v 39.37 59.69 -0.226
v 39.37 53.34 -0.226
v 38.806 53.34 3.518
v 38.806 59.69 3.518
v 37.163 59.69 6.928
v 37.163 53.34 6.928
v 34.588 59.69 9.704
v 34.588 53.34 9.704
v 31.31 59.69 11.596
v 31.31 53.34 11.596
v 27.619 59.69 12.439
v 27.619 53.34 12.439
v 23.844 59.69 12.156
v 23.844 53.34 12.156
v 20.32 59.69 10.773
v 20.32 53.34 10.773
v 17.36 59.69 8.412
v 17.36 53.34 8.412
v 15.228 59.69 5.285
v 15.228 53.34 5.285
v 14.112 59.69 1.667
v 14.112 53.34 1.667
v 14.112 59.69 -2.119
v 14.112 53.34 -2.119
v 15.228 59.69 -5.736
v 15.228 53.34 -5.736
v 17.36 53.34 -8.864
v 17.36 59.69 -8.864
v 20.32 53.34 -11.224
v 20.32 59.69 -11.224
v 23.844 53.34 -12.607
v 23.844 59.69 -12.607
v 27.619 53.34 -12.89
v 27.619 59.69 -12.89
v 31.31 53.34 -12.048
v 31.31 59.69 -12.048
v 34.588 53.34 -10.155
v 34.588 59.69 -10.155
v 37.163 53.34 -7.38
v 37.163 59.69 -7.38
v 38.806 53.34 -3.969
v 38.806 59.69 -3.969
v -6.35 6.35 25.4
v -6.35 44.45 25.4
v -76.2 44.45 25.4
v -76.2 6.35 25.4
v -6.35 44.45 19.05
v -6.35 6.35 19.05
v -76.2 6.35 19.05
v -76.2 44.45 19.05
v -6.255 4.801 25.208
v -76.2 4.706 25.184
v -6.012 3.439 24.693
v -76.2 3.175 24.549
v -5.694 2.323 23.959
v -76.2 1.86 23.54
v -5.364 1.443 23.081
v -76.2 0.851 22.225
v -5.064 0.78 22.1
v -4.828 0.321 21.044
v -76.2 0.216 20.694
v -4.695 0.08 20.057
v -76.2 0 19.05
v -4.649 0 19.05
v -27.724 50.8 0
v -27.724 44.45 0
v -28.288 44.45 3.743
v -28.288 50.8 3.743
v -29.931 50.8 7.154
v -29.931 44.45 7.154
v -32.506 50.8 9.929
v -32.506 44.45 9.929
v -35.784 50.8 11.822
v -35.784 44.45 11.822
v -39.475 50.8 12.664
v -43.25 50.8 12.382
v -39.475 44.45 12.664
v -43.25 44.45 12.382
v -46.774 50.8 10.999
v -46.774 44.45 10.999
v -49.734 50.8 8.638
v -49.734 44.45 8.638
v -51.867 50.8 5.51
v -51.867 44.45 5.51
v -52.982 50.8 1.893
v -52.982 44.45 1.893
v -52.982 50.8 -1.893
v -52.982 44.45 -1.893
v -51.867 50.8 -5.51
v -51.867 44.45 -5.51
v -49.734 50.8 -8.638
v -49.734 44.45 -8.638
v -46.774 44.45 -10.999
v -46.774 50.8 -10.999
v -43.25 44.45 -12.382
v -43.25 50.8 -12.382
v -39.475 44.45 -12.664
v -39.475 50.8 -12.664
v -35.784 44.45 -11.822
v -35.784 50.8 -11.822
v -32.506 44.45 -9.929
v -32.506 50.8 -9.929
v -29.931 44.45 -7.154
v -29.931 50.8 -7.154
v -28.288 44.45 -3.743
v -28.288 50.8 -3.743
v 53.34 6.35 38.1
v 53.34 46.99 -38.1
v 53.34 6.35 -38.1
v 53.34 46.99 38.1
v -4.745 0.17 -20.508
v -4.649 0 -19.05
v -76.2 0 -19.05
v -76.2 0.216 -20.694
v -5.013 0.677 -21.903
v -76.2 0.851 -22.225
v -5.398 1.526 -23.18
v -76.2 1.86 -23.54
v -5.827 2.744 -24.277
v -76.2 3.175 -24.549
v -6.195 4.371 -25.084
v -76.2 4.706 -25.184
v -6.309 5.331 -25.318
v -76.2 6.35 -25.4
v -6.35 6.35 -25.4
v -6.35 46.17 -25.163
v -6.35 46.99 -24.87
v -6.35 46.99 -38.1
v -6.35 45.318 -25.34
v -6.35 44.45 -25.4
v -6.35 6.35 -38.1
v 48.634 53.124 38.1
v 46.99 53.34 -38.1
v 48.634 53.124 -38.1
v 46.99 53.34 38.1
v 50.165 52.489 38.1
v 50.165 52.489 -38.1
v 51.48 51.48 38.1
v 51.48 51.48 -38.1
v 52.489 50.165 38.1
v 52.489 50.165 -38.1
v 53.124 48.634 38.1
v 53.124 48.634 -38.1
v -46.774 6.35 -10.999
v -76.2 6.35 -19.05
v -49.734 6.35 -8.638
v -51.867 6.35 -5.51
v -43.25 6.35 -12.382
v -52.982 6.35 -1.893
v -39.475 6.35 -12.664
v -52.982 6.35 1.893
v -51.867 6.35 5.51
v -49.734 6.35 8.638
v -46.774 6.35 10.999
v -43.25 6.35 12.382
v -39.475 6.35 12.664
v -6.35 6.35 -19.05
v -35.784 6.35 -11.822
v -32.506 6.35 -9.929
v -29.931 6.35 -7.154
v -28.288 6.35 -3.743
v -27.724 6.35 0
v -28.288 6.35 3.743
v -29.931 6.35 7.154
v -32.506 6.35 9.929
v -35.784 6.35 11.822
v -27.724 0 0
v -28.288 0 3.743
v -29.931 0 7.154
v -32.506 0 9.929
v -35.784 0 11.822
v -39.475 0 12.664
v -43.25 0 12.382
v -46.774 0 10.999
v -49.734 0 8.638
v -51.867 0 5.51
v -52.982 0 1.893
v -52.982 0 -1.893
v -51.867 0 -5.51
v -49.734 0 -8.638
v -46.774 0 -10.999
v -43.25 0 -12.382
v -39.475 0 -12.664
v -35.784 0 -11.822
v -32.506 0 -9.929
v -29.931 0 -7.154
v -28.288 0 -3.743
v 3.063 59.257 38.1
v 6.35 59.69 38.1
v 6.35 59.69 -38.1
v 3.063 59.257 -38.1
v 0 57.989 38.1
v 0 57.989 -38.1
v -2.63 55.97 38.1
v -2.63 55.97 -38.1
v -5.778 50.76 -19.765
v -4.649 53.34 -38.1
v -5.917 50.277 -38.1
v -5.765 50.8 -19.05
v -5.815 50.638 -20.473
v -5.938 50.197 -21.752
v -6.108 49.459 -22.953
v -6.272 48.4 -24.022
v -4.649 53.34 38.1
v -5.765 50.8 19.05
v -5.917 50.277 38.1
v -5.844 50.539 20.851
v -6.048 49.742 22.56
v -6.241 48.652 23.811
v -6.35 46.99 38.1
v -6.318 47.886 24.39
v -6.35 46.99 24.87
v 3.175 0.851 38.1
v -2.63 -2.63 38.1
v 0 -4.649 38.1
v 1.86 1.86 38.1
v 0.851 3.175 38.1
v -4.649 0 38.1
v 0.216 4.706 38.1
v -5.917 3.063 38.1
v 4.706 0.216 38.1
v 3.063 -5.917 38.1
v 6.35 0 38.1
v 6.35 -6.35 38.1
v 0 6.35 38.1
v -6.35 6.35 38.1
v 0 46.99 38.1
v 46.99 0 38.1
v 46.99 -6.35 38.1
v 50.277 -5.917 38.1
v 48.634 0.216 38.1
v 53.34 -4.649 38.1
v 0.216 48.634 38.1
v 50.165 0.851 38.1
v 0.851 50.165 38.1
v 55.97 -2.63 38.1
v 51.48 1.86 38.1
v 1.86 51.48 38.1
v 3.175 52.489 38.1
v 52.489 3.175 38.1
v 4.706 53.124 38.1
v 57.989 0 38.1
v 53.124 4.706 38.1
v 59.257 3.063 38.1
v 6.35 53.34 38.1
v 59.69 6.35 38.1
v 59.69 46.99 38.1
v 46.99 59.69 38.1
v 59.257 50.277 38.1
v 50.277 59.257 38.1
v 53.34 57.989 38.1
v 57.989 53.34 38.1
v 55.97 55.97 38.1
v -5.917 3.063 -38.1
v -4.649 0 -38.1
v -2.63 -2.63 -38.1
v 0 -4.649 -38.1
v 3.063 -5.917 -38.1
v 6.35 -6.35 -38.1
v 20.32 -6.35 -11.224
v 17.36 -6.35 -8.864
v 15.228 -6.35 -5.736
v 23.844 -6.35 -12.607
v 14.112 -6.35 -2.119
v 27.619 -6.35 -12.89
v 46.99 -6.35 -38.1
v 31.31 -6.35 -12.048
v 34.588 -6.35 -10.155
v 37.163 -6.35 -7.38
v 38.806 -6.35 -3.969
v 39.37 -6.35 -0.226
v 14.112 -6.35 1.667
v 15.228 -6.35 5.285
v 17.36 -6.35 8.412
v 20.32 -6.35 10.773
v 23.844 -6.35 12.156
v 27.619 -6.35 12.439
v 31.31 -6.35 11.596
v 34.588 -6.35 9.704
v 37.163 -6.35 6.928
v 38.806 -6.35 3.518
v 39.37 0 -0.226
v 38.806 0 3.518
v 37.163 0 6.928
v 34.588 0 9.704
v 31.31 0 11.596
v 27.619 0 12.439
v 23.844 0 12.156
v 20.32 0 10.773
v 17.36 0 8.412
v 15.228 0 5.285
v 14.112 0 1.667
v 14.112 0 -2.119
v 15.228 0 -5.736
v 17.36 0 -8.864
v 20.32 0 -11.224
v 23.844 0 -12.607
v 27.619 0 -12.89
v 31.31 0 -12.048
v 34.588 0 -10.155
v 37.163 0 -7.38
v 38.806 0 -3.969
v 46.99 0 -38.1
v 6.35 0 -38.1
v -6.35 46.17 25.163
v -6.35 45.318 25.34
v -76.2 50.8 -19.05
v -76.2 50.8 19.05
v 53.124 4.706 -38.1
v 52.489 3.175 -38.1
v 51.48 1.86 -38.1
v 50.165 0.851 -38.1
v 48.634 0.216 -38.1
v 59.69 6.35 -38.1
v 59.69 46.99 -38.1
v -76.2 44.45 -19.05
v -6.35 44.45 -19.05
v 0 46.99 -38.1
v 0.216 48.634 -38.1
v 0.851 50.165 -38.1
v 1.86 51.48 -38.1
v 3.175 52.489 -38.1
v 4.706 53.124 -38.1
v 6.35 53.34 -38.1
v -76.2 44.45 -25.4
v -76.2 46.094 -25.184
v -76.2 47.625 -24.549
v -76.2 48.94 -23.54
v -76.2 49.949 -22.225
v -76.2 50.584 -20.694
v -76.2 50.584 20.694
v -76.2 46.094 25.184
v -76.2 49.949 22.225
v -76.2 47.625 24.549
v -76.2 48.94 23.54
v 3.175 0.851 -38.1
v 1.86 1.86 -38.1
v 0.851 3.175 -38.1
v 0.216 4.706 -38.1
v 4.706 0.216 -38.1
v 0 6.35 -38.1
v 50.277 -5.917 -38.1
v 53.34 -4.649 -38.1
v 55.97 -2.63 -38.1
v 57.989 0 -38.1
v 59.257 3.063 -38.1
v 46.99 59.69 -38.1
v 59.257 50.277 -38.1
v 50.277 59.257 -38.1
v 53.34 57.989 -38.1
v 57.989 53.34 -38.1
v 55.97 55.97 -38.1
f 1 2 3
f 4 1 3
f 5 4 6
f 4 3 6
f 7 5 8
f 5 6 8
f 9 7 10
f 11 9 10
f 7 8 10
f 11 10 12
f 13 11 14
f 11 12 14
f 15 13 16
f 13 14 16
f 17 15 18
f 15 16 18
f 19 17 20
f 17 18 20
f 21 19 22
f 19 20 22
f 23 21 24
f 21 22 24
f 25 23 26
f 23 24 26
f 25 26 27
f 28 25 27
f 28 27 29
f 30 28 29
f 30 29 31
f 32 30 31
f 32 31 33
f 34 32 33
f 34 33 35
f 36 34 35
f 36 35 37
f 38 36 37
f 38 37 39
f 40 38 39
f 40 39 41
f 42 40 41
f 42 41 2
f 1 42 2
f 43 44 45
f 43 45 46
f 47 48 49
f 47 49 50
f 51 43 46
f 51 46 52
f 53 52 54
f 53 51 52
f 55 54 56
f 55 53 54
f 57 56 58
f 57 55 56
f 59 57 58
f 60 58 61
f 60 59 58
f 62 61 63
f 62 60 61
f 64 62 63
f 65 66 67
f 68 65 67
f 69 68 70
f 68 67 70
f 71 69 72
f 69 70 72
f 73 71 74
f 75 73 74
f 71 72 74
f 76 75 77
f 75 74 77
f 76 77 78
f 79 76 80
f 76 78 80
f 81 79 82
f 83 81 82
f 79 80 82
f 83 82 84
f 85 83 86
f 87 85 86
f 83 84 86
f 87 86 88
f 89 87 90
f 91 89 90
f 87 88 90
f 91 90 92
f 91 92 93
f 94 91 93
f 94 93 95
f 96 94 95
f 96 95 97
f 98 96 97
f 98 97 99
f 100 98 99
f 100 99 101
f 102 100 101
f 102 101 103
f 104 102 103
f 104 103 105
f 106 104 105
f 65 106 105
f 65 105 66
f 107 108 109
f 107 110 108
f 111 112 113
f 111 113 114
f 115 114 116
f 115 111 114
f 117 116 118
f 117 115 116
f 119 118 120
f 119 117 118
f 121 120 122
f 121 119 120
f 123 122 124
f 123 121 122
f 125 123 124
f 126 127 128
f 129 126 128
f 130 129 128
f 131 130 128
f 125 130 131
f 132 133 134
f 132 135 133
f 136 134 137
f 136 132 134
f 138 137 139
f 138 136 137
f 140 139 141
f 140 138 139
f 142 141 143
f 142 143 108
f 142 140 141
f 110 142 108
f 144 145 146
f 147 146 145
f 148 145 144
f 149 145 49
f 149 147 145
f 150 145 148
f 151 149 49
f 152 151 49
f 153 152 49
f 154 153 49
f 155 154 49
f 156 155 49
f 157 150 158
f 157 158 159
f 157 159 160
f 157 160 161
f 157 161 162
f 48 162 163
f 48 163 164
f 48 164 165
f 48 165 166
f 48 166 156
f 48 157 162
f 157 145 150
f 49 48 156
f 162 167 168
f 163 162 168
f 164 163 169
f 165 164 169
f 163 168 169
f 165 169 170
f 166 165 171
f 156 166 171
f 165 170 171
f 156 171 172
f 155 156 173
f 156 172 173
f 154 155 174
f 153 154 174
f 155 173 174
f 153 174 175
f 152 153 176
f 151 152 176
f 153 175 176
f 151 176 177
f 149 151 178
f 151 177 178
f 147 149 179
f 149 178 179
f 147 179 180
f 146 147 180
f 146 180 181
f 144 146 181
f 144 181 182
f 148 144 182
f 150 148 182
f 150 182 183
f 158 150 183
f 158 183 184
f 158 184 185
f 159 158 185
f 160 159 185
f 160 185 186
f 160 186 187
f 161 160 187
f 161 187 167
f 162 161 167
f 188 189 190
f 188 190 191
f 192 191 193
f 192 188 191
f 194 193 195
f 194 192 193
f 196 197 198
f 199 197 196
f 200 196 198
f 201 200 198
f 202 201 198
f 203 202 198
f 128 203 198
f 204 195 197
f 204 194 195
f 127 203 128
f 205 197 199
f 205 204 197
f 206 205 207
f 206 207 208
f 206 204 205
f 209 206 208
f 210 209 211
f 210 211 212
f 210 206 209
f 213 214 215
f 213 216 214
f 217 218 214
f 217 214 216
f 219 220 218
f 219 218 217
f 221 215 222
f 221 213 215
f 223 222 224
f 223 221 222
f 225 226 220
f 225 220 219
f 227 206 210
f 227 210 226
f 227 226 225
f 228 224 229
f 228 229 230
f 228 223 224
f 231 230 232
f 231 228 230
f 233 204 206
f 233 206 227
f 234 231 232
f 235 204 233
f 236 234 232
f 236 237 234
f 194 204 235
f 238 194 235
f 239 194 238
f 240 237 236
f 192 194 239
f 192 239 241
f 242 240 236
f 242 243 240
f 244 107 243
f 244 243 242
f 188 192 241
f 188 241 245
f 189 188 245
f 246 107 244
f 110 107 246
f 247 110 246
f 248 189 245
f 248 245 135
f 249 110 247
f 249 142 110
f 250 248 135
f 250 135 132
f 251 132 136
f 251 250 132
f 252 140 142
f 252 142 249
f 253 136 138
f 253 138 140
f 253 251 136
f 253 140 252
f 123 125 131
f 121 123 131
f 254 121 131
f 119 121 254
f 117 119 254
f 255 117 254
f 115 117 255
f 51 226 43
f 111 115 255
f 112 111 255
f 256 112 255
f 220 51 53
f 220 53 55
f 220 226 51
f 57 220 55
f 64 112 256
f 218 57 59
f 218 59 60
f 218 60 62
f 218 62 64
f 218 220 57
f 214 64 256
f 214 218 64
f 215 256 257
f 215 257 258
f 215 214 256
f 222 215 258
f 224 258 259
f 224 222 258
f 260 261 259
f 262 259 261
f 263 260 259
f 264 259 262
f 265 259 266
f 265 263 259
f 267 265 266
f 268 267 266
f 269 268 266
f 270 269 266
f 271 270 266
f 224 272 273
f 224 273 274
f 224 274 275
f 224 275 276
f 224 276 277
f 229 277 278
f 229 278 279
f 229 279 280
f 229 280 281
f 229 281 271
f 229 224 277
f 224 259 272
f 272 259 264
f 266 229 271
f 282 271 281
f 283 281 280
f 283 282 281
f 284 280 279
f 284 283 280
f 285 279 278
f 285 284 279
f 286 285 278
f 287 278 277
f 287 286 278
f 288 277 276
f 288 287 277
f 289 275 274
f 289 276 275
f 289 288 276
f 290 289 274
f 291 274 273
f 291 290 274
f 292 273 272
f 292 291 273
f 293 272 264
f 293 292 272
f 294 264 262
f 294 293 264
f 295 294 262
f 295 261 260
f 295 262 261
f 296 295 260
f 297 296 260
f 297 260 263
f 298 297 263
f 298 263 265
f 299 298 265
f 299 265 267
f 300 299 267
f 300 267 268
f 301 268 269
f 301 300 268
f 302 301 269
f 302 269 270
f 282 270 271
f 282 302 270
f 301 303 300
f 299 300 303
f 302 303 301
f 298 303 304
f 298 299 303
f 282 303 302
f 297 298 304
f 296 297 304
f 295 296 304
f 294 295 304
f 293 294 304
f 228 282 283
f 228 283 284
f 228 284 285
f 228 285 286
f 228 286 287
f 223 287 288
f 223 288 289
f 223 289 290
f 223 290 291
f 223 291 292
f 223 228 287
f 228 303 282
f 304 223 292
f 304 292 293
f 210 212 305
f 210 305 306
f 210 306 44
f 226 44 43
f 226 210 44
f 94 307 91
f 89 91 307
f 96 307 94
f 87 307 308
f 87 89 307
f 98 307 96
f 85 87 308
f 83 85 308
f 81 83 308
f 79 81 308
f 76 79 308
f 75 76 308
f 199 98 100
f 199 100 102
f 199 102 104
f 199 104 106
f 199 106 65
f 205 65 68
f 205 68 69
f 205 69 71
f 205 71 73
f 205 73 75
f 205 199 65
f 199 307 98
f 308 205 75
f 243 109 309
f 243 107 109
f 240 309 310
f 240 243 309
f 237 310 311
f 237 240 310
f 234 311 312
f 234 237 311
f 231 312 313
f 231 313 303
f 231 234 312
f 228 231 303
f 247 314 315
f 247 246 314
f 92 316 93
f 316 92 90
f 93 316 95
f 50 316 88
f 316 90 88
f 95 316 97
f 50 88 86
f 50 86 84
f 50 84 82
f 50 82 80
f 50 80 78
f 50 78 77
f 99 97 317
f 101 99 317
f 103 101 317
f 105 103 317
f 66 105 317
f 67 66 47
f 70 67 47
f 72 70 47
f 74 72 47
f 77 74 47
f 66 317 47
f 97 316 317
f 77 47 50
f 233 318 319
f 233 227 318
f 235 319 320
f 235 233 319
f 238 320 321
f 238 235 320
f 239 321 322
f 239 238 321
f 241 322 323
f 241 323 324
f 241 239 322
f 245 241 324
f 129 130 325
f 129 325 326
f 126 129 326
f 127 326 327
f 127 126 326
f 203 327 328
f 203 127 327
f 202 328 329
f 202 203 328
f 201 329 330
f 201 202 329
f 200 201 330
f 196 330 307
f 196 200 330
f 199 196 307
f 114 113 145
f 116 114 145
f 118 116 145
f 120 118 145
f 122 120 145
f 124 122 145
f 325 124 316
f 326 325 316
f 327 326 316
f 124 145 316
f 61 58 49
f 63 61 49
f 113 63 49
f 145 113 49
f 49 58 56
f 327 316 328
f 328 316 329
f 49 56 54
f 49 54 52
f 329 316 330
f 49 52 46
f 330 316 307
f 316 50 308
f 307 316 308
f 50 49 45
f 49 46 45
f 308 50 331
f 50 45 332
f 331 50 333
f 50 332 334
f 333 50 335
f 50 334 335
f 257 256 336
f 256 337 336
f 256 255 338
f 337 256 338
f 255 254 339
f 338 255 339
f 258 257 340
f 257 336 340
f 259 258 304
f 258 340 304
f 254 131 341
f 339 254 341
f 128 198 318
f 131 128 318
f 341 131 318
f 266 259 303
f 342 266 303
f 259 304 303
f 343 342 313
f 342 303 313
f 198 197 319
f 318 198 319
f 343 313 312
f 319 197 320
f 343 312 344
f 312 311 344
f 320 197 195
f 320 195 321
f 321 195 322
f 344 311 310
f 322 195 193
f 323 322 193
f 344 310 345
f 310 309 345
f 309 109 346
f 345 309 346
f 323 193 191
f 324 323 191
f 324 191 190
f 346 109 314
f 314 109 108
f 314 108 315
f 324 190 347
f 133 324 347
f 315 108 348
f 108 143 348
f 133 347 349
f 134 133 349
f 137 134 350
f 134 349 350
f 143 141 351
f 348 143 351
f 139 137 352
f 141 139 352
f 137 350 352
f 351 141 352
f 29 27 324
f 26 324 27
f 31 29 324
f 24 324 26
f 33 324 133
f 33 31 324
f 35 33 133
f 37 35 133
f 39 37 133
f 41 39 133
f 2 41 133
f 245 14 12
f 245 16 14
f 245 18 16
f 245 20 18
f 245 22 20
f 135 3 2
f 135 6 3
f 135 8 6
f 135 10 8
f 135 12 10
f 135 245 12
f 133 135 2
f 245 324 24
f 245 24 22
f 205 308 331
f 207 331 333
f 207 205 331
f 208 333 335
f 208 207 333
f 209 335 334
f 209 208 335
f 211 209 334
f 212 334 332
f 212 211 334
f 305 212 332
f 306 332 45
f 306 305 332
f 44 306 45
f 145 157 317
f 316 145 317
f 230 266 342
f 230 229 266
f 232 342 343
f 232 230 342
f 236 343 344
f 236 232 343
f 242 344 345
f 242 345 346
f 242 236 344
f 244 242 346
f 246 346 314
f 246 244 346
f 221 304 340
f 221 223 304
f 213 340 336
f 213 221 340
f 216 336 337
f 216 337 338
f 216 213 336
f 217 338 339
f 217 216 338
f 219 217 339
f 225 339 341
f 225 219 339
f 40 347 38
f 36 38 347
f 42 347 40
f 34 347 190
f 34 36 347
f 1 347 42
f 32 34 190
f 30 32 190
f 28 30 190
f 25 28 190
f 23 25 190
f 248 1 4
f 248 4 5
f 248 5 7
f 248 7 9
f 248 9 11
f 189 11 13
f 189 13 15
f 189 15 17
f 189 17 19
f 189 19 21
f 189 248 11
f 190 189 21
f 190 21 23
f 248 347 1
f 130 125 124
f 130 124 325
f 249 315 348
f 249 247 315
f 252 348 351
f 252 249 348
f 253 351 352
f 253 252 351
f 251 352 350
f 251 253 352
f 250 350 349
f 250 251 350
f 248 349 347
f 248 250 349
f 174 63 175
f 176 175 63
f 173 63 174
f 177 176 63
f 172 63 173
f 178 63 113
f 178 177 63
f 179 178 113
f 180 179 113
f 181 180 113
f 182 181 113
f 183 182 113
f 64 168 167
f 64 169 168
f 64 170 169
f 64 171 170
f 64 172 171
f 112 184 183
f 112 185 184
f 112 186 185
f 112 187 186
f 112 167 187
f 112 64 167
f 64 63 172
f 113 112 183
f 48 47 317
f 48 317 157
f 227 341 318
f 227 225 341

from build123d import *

# Parameters (mm, degrees)
F1_DEPTH      = 38.1
F2_R          = 12.7
F3_DEPTH      = 59.6909986267
F3_DEPTH_BACK = 25.4
F4_W          = 38.0999967456
F4_H          = 38.0999967456
F5_DEPTH      = 76.2
F6_R          = 12.7
F7_DEPTH      = 59.6909987267


with BuildPart() as f1:
    # F0 (on Top) → F1 (new body, symmetric)
    with BuildSketch(Plane.XY):
        with BuildLine():
            Line((46.99, 59.6899986267), (6.35, 59.6899986267))
            ThreePointArc((6.35, 59.6899986267), (-2.63025515, 55.97025515), (-6.3499986267, 46.99))
            Line((-6.3499986267, 46.99), (-6.3499986267, 6.35))
            ThreePointArc((-6.3499986267, 6.35), (-2.63025515, -2.63025515), (6.35, -6.3499986267))
            Line((6.35, -6.3499986267), (46.99, -6.3499986267))
            ThreePointArc((46.99, -6.3499986267), (55.97025515, -2.63025515), (59.6899986267, 6.35))
            Line((59.6899986267, 6.35), (59.6899986267, 46.99))
            ThreePointArc((59.6899986267, 46.99), (55.97025515, 55.97025515), (46.99, 59.6899986267))
        make_face()
        with BuildLine():
            Line((46.99, 0), (6.35, 0))
            ThreePointArc((6.35, 0), (1.8598719395, 1.8598719395), (0, 6.35))
            Line((0, 6.35), (0, 46.99))
            ThreePointArc((0, 46.99), (1.8598719395, 51.4801280605), (6.35, 53.34))
            Line((6.35, 53.34), (46.99, 53.34))
            ThreePointArc((46.99, 53.34), (51.4801280605, 51.4801280605), (53.34, 46.99))
            Line((53.34, 46.99), (53.34, 6.35))
            ThreePointArc((53.34, 6.35), (51.4801280605, 1.8598719395), (46.99, 0))
        make_face(mode=Mode.SUBTRACT)
    extrude(amount=F1_DEPTH, both=True)

    # F2 (on Front) → F3 (cut, two sides)
    with BuildSketch(Plane.XZ) as f3_sk:
        with Locations((26.67, -0.2257099867)):
            Circle(F2_R)
    extrude(amount=-F3_DEPTH, mode=Mode.SUBTRACT)
    extrude(f3_sk.sketch, amount=F3_DEPTH_BACK, mode=Mode.SUBTRACT)

    # F4 (on Right) → F5 (join)
    with BuildSketch(Plane.YZ):
        with BuildLine():
            ThreePointArc((50.8, 19.05), (48.9401280605, 23.5401280605), (44.45, 25.4))
            Line((44.45, 25.4), (6.35, 25.4))
            ThreePointArc((6.35, 25.4), (1.8598719395, 23.5401280605), (0, 19.05))
            Line((0, 19.05), (0, -19.05))
            ThreePointArc((0, -19.05), (1.8598719395, -23.5401280605), (6.35, -25.4))
            Line((6.35, -25.4), (44.45, -25.4))
            ThreePointArc((44.45, -25.4), (48.9401280605, -23.5401280605), (50.8, -19.05))
            Line((50.8, -19.05), (50.8, 19.05))
        make_face()
        with Locations((25.4, 0)):
            Rectangle(F4_W, F4_H, mode=Mode.SUBTRACT)
    extrude(amount=-F5_DEPTH)

    # F6 (on Front) → F7 (cut, through all)
    with BuildSketch(Plane.XZ):
        with Locations((-40.4242605212, 0)):
            Circle(F6_R)
    extrude(amount=-F7_DEPTH, mode=Mode.SUBTRACT)


solid = f1.part
